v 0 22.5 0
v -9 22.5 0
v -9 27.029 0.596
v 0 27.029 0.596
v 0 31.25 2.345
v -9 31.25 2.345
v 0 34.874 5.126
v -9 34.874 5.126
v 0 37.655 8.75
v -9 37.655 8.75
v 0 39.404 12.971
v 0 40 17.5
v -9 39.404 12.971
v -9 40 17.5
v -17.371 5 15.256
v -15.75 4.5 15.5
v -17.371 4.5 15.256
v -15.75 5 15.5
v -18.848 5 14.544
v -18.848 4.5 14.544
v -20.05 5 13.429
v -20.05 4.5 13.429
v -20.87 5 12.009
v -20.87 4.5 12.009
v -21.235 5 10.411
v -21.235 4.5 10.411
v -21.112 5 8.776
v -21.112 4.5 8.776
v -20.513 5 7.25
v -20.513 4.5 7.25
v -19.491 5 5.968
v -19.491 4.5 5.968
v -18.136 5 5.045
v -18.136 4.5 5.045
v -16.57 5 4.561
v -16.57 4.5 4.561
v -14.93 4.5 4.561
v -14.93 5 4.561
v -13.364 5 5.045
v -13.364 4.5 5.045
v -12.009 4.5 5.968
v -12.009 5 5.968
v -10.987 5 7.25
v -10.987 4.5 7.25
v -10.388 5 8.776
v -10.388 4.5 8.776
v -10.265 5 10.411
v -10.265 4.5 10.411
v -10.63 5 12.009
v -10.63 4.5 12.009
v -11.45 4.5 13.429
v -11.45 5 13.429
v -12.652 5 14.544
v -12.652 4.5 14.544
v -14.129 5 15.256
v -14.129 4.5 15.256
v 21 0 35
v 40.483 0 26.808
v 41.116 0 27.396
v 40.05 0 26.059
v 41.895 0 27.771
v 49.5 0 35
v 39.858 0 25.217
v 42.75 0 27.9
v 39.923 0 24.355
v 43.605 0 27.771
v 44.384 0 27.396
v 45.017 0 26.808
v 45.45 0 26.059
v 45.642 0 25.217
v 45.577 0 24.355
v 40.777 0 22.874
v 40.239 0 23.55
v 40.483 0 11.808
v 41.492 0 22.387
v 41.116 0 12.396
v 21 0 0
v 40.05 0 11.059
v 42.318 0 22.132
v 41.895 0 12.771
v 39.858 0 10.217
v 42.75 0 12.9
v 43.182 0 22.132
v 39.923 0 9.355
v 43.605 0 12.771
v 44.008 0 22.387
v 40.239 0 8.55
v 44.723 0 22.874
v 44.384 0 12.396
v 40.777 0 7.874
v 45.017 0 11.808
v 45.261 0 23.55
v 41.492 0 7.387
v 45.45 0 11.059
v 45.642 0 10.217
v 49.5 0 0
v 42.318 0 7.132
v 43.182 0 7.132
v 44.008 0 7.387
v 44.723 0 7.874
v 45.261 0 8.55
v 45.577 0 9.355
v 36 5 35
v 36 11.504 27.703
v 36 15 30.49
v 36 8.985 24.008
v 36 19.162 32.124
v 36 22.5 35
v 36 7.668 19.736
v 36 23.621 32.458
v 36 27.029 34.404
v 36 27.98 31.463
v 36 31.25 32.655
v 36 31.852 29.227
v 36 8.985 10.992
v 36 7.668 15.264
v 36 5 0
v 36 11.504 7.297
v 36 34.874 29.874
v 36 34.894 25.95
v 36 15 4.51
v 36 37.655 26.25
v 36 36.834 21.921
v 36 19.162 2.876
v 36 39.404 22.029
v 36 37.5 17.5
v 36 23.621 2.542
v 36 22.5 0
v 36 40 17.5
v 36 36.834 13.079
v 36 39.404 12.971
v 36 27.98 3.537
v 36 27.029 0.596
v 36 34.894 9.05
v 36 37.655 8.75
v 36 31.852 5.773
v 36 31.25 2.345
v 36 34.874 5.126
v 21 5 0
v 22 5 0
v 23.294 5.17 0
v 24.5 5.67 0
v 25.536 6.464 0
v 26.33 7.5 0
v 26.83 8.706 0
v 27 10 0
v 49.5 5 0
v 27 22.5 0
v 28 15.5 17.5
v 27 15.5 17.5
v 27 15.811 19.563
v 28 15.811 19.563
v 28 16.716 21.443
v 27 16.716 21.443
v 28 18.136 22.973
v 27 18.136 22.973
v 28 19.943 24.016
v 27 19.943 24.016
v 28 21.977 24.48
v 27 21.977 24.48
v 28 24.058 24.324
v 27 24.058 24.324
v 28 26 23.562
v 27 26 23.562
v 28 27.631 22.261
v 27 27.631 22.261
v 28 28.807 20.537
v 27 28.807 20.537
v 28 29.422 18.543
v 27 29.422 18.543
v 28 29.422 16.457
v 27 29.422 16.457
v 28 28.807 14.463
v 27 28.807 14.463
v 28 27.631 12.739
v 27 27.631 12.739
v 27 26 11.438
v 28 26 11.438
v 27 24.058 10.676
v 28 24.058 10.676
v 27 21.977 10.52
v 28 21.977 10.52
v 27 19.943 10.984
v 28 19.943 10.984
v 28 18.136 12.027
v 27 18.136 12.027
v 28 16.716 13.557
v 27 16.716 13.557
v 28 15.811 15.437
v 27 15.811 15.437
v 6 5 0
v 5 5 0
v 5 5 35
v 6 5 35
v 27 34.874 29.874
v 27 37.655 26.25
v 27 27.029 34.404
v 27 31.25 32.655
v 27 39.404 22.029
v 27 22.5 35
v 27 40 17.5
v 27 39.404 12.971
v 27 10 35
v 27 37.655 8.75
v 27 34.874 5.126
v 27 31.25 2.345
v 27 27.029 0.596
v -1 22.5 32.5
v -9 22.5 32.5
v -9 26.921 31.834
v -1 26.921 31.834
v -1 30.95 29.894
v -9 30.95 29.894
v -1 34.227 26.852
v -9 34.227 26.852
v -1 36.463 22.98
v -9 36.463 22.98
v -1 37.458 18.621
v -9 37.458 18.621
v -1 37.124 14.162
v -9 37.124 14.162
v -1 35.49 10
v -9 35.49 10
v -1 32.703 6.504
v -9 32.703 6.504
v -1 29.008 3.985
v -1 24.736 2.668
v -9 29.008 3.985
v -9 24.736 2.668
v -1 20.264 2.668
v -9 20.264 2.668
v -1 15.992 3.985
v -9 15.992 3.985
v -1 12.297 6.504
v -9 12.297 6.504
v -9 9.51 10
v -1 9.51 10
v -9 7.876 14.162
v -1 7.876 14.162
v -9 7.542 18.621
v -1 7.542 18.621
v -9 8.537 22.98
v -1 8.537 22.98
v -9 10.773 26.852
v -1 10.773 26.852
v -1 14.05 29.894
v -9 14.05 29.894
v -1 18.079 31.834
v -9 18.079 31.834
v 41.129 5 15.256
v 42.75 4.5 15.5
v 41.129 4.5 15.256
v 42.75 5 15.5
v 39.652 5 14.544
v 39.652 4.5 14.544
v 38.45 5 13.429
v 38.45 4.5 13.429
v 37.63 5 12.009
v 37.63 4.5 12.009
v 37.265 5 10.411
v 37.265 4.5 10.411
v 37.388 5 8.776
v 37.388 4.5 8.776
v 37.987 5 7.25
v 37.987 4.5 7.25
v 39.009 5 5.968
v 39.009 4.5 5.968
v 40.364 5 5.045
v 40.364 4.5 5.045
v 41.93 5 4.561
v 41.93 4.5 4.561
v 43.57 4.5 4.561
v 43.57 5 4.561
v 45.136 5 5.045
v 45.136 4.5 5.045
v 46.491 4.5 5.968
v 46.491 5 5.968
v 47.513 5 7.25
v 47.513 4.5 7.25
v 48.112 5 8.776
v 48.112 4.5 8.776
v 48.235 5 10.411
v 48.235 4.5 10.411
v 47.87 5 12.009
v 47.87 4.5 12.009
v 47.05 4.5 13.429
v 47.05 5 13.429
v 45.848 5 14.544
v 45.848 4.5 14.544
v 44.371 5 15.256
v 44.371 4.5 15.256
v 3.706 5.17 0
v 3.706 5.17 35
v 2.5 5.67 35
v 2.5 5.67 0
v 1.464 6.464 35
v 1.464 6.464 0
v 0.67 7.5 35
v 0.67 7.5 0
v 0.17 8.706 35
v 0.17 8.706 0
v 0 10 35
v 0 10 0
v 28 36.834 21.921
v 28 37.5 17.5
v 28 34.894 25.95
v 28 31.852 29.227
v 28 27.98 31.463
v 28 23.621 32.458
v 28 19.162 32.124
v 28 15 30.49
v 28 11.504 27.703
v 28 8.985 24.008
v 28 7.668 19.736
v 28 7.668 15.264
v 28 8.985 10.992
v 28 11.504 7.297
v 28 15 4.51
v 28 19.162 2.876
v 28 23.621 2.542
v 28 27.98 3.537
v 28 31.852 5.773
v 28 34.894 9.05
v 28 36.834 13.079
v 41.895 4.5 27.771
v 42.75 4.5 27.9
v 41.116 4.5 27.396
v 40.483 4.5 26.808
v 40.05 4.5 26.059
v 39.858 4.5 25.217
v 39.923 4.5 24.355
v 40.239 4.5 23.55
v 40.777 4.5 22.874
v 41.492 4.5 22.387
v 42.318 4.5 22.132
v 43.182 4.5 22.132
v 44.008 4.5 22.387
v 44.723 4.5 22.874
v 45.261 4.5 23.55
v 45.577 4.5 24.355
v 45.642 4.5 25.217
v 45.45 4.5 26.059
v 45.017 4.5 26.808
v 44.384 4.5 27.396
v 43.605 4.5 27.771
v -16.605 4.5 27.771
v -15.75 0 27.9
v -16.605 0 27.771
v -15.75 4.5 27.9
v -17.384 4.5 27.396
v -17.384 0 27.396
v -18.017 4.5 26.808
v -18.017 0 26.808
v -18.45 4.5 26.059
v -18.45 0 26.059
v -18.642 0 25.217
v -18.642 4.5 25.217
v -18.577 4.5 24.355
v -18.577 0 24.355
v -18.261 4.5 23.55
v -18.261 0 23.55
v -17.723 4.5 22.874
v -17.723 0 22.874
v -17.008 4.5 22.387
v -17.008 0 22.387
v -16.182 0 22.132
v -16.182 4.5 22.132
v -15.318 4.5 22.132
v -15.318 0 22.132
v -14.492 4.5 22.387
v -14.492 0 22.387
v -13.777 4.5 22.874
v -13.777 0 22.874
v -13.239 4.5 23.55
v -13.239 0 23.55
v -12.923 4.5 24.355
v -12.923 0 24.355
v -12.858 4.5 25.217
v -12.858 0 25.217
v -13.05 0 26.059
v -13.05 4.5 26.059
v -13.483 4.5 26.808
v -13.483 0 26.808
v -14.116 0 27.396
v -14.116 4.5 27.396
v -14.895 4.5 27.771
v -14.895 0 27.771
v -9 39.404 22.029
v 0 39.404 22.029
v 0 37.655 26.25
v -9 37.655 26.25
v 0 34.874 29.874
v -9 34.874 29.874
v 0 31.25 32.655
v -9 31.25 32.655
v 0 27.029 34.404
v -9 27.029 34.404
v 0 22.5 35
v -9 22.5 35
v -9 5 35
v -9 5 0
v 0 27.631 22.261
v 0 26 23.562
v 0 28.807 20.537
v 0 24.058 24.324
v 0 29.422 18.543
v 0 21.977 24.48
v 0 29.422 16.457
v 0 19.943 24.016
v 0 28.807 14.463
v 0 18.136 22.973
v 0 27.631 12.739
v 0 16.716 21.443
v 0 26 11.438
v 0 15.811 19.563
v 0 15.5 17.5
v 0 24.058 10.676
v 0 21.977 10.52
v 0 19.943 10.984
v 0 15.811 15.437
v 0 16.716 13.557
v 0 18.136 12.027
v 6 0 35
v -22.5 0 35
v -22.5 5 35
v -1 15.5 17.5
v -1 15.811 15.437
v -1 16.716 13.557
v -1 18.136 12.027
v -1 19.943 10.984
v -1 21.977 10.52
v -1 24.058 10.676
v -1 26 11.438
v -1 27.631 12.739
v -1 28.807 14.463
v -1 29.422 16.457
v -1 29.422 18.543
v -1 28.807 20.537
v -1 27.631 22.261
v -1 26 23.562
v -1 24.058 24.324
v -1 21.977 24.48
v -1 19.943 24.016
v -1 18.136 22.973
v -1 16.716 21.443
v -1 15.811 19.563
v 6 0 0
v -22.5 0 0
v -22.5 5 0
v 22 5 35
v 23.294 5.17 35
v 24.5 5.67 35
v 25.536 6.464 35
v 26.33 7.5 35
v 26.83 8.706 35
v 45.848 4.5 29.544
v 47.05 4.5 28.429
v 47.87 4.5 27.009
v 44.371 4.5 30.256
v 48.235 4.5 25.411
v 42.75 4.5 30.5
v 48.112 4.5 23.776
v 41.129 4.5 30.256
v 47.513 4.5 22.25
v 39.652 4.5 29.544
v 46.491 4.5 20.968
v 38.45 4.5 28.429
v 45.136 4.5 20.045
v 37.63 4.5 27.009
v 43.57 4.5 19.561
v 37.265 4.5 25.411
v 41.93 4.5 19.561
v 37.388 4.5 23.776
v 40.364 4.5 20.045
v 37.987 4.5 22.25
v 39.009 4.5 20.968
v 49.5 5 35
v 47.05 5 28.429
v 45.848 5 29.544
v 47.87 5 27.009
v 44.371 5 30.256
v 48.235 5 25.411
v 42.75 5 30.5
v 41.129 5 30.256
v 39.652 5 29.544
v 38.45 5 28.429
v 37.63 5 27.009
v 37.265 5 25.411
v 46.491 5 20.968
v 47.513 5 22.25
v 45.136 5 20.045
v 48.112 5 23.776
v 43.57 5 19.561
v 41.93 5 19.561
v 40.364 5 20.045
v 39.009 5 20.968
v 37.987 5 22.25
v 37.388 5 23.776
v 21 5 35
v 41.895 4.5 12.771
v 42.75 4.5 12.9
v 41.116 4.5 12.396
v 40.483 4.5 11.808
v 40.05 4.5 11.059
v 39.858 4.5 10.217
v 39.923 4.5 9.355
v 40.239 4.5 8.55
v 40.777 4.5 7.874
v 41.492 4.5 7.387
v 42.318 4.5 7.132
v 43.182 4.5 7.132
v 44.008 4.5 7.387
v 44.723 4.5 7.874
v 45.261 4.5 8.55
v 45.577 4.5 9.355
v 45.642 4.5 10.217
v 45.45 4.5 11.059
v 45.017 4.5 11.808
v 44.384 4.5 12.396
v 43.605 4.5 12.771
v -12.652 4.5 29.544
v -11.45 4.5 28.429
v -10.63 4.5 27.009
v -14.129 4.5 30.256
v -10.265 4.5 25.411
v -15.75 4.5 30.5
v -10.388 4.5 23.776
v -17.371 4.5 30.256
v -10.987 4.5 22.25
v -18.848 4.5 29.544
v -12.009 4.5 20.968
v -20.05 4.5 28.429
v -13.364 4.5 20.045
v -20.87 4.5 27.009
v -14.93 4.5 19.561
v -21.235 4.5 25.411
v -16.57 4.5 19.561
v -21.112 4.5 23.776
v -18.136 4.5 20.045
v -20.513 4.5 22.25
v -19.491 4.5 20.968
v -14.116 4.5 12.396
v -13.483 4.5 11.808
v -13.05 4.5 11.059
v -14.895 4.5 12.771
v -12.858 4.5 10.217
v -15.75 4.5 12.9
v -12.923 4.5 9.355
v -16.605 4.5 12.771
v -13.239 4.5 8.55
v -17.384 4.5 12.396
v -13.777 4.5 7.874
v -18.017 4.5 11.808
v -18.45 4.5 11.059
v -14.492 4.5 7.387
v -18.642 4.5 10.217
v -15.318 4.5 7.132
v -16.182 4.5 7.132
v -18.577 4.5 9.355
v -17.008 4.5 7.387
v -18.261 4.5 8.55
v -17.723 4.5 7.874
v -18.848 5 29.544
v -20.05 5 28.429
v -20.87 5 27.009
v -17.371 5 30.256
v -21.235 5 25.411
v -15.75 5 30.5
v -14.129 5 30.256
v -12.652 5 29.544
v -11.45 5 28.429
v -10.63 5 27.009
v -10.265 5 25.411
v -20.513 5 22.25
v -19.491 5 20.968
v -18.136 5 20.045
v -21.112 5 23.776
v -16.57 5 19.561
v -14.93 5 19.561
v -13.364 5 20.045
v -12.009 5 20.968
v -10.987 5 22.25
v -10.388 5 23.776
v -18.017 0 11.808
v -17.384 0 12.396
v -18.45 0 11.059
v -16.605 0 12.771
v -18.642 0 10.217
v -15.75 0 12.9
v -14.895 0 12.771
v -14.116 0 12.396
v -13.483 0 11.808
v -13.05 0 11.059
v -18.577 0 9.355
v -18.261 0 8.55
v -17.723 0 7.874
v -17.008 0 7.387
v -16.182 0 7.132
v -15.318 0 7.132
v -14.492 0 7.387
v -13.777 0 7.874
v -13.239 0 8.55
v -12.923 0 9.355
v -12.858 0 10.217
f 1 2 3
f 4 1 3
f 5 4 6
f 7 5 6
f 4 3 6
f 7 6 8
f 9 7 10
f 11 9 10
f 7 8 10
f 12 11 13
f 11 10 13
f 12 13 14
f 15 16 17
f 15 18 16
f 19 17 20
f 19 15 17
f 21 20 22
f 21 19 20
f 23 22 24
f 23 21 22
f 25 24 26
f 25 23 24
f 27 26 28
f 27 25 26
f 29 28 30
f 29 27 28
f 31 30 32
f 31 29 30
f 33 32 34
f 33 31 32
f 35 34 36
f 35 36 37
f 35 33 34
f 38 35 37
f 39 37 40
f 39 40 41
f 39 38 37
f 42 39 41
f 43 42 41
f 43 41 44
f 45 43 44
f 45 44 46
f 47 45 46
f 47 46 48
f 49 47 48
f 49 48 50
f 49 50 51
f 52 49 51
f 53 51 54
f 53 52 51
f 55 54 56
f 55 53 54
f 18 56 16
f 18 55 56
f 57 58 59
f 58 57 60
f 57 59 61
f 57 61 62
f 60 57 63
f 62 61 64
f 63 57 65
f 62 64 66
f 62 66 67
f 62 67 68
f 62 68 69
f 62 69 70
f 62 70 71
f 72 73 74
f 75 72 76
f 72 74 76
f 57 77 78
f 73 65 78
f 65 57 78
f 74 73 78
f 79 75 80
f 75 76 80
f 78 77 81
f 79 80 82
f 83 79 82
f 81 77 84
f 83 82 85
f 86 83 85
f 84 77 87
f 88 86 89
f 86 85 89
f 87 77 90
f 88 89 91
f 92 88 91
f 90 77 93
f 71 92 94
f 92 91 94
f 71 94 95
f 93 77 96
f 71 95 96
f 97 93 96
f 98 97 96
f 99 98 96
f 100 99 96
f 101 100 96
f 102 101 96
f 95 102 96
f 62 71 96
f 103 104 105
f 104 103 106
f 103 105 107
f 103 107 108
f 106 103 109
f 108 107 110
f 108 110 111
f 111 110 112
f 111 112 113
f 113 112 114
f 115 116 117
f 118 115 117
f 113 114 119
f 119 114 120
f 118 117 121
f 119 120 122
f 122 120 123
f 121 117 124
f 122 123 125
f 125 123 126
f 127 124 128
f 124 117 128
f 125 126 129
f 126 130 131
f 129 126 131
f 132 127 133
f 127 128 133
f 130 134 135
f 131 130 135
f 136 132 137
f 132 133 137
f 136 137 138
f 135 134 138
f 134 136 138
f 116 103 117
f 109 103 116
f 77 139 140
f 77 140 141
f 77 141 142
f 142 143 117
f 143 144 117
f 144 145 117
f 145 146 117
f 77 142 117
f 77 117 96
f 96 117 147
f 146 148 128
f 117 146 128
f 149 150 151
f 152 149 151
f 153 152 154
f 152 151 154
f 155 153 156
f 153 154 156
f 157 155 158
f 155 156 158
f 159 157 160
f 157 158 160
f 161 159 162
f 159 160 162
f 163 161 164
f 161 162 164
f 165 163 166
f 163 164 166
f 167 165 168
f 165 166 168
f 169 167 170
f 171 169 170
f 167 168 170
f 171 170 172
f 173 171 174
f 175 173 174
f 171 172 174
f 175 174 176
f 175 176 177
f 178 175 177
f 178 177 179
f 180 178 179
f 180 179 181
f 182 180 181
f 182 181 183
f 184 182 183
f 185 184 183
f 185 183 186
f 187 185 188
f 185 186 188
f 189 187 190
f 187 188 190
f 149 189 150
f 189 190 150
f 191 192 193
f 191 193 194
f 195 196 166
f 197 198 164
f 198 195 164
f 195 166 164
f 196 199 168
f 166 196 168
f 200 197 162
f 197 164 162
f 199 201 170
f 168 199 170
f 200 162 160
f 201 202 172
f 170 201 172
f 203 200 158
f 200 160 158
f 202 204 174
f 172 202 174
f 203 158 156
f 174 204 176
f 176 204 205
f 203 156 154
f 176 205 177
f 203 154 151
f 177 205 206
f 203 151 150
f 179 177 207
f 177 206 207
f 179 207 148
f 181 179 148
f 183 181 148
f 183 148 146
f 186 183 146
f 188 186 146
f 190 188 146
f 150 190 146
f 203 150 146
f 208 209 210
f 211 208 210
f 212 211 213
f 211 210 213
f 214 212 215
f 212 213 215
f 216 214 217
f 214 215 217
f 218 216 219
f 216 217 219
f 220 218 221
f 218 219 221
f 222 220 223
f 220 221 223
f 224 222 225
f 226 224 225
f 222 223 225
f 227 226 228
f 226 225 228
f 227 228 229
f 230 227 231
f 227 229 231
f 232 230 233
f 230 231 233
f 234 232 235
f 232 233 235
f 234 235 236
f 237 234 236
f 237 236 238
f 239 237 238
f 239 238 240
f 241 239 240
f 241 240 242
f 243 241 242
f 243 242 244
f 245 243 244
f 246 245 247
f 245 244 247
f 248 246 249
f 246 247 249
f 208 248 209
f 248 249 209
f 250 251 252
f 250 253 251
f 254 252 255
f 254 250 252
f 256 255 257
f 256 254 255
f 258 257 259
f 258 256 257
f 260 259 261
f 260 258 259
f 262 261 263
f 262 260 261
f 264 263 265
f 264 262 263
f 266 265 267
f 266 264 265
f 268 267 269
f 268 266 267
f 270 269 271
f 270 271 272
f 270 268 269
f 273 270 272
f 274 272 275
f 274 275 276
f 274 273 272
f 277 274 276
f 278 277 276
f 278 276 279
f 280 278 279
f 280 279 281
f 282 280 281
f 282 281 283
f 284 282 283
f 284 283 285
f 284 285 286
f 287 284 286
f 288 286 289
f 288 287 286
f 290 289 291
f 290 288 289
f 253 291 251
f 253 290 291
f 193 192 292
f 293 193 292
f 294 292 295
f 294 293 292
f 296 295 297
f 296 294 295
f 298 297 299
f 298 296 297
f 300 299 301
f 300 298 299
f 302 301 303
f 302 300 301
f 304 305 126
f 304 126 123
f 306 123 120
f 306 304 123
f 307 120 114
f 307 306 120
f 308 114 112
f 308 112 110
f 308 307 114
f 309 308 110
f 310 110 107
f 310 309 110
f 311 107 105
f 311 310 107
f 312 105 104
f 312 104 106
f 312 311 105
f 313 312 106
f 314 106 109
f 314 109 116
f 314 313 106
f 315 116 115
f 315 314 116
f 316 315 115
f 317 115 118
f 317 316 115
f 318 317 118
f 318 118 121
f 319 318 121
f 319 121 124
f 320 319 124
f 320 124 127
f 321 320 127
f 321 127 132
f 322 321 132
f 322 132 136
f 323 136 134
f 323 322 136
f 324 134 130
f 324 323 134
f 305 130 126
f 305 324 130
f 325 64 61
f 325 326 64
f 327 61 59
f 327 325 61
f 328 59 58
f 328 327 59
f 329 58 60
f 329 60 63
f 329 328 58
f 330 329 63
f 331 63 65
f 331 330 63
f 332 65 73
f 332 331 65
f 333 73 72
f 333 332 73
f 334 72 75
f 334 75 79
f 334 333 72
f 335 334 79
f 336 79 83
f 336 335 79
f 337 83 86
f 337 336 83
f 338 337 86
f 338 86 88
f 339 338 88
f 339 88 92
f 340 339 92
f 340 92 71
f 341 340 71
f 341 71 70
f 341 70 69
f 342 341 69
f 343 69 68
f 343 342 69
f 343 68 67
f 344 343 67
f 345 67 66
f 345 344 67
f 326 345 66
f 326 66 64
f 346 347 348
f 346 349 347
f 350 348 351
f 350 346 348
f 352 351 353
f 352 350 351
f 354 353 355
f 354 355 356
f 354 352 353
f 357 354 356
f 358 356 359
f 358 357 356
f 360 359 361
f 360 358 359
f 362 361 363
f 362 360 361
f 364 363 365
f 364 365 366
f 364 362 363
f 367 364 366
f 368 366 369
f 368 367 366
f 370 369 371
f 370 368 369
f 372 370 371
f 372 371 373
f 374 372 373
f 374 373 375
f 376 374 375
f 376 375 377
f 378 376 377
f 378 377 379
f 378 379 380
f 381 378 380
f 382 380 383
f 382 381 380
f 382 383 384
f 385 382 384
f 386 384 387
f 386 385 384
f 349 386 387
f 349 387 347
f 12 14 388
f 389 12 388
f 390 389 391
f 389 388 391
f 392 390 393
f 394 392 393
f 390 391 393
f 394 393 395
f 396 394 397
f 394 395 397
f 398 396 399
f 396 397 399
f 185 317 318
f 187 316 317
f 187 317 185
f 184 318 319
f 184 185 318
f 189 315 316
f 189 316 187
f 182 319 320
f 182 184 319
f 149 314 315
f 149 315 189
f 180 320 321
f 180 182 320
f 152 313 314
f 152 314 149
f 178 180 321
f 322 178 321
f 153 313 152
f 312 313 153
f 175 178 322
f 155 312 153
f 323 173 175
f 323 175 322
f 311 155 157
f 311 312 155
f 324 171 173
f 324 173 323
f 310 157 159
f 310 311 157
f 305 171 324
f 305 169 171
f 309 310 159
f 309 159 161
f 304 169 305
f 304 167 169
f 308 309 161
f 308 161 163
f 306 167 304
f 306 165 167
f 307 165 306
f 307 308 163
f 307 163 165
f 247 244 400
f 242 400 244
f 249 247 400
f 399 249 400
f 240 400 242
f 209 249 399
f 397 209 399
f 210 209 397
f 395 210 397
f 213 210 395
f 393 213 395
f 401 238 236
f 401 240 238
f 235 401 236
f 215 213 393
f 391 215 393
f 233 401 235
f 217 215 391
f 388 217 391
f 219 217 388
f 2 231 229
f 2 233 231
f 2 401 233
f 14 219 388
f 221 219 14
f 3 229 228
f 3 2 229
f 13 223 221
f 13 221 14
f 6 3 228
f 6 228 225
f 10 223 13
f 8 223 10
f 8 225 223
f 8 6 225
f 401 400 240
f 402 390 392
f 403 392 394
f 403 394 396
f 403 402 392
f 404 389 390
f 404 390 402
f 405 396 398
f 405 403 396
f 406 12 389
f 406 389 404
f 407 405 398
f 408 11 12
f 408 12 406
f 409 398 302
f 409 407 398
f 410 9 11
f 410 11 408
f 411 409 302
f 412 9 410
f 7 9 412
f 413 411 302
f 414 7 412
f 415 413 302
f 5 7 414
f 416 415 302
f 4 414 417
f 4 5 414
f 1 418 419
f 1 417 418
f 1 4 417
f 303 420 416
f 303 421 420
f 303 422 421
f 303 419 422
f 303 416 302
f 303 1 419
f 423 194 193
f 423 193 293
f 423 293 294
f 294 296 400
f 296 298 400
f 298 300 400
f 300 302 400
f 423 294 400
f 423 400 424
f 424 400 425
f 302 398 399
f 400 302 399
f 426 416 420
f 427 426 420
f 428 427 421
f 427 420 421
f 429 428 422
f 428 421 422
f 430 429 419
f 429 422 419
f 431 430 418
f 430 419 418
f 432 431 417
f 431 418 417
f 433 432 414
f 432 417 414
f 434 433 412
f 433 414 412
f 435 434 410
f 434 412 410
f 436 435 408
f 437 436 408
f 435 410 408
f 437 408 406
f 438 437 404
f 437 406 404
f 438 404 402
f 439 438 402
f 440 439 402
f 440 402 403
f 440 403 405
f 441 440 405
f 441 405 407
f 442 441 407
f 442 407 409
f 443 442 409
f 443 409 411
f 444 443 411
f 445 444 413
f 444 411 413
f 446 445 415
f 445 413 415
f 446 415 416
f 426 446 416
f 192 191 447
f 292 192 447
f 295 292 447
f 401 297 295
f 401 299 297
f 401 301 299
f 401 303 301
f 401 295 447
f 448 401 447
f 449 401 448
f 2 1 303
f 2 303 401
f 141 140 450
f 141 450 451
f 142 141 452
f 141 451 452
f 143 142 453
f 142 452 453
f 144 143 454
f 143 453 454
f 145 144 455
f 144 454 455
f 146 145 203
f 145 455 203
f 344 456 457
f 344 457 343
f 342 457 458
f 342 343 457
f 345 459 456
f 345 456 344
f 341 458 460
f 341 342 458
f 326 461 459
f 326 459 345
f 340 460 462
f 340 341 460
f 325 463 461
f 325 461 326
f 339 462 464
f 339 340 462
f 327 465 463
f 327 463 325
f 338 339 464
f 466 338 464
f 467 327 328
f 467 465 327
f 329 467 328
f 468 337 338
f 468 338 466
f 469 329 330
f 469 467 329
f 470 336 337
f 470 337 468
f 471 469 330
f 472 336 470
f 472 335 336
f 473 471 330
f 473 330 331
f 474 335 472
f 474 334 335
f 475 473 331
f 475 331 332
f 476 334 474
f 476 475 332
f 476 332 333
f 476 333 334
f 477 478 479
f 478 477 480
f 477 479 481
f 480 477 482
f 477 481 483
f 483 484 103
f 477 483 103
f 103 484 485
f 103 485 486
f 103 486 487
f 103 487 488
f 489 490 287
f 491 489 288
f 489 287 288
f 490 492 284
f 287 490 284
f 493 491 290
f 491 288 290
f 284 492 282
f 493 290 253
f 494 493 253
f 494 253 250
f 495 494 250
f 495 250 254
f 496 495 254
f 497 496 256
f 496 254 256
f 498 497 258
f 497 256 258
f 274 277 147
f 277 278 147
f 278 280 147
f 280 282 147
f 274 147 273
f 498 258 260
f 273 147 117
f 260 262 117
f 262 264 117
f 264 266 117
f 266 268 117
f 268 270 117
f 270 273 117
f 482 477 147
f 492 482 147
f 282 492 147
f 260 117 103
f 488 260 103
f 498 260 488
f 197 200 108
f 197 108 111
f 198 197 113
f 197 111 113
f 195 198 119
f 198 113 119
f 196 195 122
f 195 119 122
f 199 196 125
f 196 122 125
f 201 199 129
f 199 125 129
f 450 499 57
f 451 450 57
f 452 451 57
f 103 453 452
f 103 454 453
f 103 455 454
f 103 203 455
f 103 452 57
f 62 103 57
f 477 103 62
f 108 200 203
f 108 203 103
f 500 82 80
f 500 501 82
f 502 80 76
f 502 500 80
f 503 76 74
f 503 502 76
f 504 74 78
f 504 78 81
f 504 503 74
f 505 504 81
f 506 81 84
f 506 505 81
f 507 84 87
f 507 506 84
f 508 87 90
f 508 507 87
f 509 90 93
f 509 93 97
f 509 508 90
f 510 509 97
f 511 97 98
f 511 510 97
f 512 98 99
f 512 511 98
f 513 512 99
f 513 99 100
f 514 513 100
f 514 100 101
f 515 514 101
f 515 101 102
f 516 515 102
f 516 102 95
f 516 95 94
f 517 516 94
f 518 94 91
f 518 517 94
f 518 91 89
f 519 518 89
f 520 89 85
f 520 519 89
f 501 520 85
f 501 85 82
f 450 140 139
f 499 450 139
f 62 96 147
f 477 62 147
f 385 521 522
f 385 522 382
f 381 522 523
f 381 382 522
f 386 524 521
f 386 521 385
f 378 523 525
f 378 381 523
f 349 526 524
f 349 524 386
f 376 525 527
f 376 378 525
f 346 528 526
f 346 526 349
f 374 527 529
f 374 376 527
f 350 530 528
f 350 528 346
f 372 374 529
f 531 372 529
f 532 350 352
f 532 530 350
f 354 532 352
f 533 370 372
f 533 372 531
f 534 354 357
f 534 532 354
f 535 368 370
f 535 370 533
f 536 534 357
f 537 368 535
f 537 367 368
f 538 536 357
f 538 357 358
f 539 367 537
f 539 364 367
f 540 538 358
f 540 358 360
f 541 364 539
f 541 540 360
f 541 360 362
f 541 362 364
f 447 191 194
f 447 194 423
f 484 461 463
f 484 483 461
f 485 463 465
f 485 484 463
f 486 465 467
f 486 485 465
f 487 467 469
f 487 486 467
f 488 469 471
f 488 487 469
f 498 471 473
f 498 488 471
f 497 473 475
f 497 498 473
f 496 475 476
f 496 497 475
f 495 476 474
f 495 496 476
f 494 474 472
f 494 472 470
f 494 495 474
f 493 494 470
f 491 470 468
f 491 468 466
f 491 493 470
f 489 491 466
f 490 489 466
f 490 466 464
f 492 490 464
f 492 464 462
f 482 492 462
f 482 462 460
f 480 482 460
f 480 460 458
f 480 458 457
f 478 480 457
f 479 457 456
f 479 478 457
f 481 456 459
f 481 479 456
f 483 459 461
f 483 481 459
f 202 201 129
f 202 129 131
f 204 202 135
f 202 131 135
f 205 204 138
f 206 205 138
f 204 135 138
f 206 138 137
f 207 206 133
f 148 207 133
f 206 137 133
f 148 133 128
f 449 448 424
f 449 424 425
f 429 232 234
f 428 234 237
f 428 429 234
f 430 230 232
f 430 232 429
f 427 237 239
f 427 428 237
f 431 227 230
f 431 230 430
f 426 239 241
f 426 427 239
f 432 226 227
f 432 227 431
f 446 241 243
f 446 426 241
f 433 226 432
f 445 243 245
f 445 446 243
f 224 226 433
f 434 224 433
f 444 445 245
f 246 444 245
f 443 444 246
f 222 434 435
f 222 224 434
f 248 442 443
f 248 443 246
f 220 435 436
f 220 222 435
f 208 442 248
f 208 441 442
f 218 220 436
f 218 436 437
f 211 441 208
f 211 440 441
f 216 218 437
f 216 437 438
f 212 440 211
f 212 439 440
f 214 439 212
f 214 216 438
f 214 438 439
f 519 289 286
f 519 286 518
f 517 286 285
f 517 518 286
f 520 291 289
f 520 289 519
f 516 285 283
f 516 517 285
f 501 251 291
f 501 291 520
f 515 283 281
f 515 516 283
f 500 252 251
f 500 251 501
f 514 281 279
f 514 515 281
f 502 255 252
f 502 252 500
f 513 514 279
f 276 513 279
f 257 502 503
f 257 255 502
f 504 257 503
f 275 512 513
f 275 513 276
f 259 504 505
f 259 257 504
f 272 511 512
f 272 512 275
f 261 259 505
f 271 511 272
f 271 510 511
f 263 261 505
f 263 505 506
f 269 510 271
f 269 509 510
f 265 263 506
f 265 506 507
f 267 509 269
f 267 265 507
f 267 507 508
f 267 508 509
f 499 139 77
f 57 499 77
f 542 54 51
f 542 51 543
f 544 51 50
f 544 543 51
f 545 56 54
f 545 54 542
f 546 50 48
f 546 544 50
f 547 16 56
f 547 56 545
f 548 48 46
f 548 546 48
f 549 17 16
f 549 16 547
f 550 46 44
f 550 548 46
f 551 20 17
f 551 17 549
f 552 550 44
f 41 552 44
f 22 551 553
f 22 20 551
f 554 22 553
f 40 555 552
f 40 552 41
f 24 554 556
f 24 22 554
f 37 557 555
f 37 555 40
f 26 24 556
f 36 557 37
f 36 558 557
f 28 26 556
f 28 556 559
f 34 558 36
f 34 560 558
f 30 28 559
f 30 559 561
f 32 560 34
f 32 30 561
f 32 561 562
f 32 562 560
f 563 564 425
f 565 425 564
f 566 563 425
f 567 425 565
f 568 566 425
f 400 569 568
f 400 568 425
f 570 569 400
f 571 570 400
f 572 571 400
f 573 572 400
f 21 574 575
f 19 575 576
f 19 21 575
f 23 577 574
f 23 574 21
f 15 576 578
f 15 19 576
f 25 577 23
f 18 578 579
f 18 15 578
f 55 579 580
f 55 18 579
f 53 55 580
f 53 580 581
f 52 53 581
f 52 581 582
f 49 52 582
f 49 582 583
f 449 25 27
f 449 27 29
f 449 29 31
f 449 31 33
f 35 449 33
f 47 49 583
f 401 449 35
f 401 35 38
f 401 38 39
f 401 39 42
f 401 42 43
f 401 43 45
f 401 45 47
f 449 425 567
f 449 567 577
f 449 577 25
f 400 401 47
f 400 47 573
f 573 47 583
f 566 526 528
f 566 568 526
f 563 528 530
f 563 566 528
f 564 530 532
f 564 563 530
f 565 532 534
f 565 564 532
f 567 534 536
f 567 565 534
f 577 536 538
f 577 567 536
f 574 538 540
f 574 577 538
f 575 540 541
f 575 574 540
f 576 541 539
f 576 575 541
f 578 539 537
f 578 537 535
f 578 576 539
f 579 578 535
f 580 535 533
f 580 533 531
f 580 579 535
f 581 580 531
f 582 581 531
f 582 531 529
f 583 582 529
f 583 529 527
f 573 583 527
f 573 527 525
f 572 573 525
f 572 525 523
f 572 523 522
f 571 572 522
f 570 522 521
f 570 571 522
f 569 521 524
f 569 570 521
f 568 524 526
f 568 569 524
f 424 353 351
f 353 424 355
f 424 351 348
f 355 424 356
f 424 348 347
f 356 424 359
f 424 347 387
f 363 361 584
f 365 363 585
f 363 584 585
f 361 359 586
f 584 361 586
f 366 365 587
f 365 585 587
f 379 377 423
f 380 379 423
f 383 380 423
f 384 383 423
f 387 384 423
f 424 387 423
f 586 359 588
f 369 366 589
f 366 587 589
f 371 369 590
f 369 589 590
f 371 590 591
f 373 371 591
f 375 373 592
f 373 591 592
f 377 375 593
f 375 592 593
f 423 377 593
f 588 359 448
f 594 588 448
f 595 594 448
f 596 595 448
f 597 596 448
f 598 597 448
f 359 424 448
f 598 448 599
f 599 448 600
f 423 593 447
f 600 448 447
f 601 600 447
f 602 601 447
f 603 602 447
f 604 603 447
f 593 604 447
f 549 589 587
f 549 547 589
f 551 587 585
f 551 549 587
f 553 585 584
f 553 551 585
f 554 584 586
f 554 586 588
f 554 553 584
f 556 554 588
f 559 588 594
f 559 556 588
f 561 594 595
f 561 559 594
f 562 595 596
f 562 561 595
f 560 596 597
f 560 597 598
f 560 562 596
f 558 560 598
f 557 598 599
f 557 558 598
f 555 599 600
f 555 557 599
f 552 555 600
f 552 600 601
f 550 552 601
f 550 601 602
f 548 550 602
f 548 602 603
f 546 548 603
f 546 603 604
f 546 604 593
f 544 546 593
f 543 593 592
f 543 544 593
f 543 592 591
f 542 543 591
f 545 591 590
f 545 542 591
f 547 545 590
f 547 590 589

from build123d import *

# Parameters (mm, degrees)
EXTRUDE_2_DEPTH            = 35
EXTRUDE_2_2_DEPTH          = 35
CUT_EXTRUDE_11_DEPTH       = 9
CUT_EXTRUDE_12_DEPTH       = 9
SKETCH_6_R                 = 15
CUT_EXTRUDE_13_DEPTH       = 8
CUT_EXTRUDE_START          = -8
SKETCH_7_R                 = 15
CUT_EXTRUDE_15_DEPTH       = 8
SKETCH_16_R                = 7
CUT_EXTRUDE_18_DEPTH       = 1
SKETCH_17_R                = 7
CUT_EXTRUDE_19_DEPTH       = 1
HOLE_WIZARD_C_1_AT_2_COUNT = 2
HOLE_WIZARD_C_1_AT_2_PITCH = 15
HOLE_WIZARD_C_1_AT_3_COUNT = 2
HOLE_WIZARD_C_1_AT_3_PITCH = 58.5
HOLE_WIZARD_C_1_AT_4_COUNT = 2
HOLE_WIZARD_C_1_AT_4_PITCH = 60.392466418
FILLET_3_R                 = 5
FILLET_4_R                 = 5


with BuildPart() as part:
    # 草图2 → 凸台-拉伸2 (new body)
    with BuildSketch(Plane.XY):
        Polygon((0, 0), (-8.062518271, 0), (-22.5, 0), (-22.5, 5), (-9, 5), (-9, 40), (0, 40), (0, 5), (6, 5), (6, 0), align=None)
    extrude(amount=EXTRUDE_2_DEPTH)

    # 草图5 → 切除-拉伸12 (cut)
    with BuildSketch(Plane.ZY.offset(9)):
        with BuildLine():
            Line((0, 40), (0, 22.5))
            ThreePointArc((0, 22.5), (5.125631329, 34.874368671), (17.5, 40))
            Line((17.5, 40), (0, 40))
        make_face()
        with BuildLine():
            ThreePointArc((17.5, 40), (29.874368671, 34.874368671), (35, 22.5))
            Line((35, 22.5), (35, 40))
            Line((35, 40), (17.5, 40))
        make_face()
    extrude(amount=-CUT_EXTRUDE_12_DEPTH, mode=Mode.SUBTRACT)

    # 草图6 → 切除-拉伸13 (cut)
    with BuildSketch(Plane.ZY.offset(9)):
        with Locations((17.5, 22.5)):
            Circle(SKETCH_6_R)
    extrude(amount=-CUT_EXTRUDE_13_DEPTH, mode=Mode.SUBTRACT)

    # 草图17 → 切除-拉伸19 (cut)
    with BuildSketch(Plane(origin=(0, 0, 0), x_dir=(0, 0, -1), z_dir=(1, 0, 0))):
        with Locations((-17.5, 22.5)):
            Circle(SKETCH_17_R)
    extrude(amount=-CUT_EXTRUDE_19_DEPTH, mode=Mode.SUBTRACT)

    # 草图20 → 打孔尺寸(%根据六角头螺)栓 C 级的类型1 (revolve, cut)
    with BuildSketch(Plane(origin=(-15.75, 5, 10), x_dir=(0, 0, 1), z_dir=(1, 0, 0))):
        Polygon((0, 0), (0, 6.742495795), (2.9, 5), (2.9, 0.5), (5.5, 0.5), (5.5, 0), align=None)
    hole_wizard_c_1 = revolve(axis=Axis((-15.75, 11.35, 10), (0, -1, 0)), mode=Mode.SUBTRACT)

    # 打孔尺寸(%根据六角头螺)栓 C 级的类型1 at 2: 打孔尺寸(%根据六角头螺)栓 C 级的类型1 ×2
    with Locations(*[(0, 0, i * HOLE_WIZARD_C_1_AT_2_PITCH) for i in range(1, HOLE_WIZARD_C_1_AT_2_COUNT)]):
        add(hole_wizard_c_1, mode=Mode.SUBTRACT)

    # 圆角4
    fillet_4_edges = [part.edges().sort_by_distance(p)[0] for p in [
        (0, 5, 17.5),
    ]]
    fillet(fillet_4_edges, radius=FILLET_4_R)


with BuildPart() as body_2:
    # 草图2 → Extrude 2 2 (new body)
    with BuildSketch(Plane.XY):
        Polygon((49.5, 0), (49.5, 5), (36, 5), (36, 40), (27, 40), (27, 5), (21, 5), (21, 0), (27, 0), (35.062518271, 0), align=None)
    extrude(amount=EXTRUDE_2_2_DEPTH)

    # 草图4 → 切除-拉伸11 (cut)
    with BuildSketch(Plane(origin=(36, 0, 0), x_dir=(0, 0, -1), z_dir=(1, 0, 0))):
        with BuildLine():
            Line((-35, 40), (-35, 22.5))
            ThreePointArc((-35, 22.5), (-29.874368671, 34.874368671), (-17.5, 40))
            Line((-17.5, 40), (-35, 40))
        make_face()
        with BuildLine():
            ThreePointArc((-17.5, 40), (-5.125631329, 34.874368671), (0, 22.5))
            Line((0, 22.5), (0, 40))
            Line((0, 40), (-17.5, 40))
        make_face()
    extrude(amount=-CUT_EXTRUDE_11_DEPTH, mode=Mode.SUBTRACT)

    # 草图7 → 切除-拉伸15 (cut)
    with BuildSketch(Plane(origin=(36, 0, 0), x_dir=(0, 0, -1), z_dir=(1, 0, 0)).offset(CUT_EXTRUDE_START)):
        with Locations((-17.5, 22.5)):
            Circle(SKETCH_7_R)
    extrude(amount=CUT_EXTRUDE_15_DEPTH, mode=Mode.SUBTRACT)

    # 草图16 → 切除-拉伸18 (cut)
    with BuildSketch(Plane.ZY.offset(-27)):
        with Locations((17.5, 22.5)):
            Circle(SKETCH_16_R)
    extrude(amount=-CUT_EXTRUDE_18_DEPTH, mode=Mode.SUBTRACT)

    # 打孔尺寸(%根据六角头螺)栓 C 级的类型1 at 3: 打孔尺寸(%根据六角头螺)栓 C 级的类型1 ×2
    with Locations(*[(i * HOLE_WIZARD_C_1_AT_3_PITCH, 0, 0) for i in range(1, HOLE_WIZARD_C_1_AT_3_COUNT)]):
        add(hole_wizard_c_1, mode=Mode.SUBTRACT)

    # 打孔尺寸(%根据六角头螺)栓 C 级的类型1 at 4: 打孔尺寸(%根据六角头螺)栓 C 级的类型1 ×2
    with Locations(*[Vector(0.968663866044045, 0, 0.24837535026770385) * (i * HOLE_WIZARD_C_1_AT_4_PITCH) for i in range(1, HOLE_WIZARD_C_1_AT_4_COUNT)]):
        add(hole_wizard_c_1, mode=Mode.SUBTRACT)

    # 圆角3
    fillet_3_edges = [body_2.edges().sort_by_distance(p)[0] for p in [
        (27, 5, 17.5),
    ]]
    fillet(fillet_3_edges, radius=FILLET_3_R)


solid = Compound([part.part, body_2.part])
